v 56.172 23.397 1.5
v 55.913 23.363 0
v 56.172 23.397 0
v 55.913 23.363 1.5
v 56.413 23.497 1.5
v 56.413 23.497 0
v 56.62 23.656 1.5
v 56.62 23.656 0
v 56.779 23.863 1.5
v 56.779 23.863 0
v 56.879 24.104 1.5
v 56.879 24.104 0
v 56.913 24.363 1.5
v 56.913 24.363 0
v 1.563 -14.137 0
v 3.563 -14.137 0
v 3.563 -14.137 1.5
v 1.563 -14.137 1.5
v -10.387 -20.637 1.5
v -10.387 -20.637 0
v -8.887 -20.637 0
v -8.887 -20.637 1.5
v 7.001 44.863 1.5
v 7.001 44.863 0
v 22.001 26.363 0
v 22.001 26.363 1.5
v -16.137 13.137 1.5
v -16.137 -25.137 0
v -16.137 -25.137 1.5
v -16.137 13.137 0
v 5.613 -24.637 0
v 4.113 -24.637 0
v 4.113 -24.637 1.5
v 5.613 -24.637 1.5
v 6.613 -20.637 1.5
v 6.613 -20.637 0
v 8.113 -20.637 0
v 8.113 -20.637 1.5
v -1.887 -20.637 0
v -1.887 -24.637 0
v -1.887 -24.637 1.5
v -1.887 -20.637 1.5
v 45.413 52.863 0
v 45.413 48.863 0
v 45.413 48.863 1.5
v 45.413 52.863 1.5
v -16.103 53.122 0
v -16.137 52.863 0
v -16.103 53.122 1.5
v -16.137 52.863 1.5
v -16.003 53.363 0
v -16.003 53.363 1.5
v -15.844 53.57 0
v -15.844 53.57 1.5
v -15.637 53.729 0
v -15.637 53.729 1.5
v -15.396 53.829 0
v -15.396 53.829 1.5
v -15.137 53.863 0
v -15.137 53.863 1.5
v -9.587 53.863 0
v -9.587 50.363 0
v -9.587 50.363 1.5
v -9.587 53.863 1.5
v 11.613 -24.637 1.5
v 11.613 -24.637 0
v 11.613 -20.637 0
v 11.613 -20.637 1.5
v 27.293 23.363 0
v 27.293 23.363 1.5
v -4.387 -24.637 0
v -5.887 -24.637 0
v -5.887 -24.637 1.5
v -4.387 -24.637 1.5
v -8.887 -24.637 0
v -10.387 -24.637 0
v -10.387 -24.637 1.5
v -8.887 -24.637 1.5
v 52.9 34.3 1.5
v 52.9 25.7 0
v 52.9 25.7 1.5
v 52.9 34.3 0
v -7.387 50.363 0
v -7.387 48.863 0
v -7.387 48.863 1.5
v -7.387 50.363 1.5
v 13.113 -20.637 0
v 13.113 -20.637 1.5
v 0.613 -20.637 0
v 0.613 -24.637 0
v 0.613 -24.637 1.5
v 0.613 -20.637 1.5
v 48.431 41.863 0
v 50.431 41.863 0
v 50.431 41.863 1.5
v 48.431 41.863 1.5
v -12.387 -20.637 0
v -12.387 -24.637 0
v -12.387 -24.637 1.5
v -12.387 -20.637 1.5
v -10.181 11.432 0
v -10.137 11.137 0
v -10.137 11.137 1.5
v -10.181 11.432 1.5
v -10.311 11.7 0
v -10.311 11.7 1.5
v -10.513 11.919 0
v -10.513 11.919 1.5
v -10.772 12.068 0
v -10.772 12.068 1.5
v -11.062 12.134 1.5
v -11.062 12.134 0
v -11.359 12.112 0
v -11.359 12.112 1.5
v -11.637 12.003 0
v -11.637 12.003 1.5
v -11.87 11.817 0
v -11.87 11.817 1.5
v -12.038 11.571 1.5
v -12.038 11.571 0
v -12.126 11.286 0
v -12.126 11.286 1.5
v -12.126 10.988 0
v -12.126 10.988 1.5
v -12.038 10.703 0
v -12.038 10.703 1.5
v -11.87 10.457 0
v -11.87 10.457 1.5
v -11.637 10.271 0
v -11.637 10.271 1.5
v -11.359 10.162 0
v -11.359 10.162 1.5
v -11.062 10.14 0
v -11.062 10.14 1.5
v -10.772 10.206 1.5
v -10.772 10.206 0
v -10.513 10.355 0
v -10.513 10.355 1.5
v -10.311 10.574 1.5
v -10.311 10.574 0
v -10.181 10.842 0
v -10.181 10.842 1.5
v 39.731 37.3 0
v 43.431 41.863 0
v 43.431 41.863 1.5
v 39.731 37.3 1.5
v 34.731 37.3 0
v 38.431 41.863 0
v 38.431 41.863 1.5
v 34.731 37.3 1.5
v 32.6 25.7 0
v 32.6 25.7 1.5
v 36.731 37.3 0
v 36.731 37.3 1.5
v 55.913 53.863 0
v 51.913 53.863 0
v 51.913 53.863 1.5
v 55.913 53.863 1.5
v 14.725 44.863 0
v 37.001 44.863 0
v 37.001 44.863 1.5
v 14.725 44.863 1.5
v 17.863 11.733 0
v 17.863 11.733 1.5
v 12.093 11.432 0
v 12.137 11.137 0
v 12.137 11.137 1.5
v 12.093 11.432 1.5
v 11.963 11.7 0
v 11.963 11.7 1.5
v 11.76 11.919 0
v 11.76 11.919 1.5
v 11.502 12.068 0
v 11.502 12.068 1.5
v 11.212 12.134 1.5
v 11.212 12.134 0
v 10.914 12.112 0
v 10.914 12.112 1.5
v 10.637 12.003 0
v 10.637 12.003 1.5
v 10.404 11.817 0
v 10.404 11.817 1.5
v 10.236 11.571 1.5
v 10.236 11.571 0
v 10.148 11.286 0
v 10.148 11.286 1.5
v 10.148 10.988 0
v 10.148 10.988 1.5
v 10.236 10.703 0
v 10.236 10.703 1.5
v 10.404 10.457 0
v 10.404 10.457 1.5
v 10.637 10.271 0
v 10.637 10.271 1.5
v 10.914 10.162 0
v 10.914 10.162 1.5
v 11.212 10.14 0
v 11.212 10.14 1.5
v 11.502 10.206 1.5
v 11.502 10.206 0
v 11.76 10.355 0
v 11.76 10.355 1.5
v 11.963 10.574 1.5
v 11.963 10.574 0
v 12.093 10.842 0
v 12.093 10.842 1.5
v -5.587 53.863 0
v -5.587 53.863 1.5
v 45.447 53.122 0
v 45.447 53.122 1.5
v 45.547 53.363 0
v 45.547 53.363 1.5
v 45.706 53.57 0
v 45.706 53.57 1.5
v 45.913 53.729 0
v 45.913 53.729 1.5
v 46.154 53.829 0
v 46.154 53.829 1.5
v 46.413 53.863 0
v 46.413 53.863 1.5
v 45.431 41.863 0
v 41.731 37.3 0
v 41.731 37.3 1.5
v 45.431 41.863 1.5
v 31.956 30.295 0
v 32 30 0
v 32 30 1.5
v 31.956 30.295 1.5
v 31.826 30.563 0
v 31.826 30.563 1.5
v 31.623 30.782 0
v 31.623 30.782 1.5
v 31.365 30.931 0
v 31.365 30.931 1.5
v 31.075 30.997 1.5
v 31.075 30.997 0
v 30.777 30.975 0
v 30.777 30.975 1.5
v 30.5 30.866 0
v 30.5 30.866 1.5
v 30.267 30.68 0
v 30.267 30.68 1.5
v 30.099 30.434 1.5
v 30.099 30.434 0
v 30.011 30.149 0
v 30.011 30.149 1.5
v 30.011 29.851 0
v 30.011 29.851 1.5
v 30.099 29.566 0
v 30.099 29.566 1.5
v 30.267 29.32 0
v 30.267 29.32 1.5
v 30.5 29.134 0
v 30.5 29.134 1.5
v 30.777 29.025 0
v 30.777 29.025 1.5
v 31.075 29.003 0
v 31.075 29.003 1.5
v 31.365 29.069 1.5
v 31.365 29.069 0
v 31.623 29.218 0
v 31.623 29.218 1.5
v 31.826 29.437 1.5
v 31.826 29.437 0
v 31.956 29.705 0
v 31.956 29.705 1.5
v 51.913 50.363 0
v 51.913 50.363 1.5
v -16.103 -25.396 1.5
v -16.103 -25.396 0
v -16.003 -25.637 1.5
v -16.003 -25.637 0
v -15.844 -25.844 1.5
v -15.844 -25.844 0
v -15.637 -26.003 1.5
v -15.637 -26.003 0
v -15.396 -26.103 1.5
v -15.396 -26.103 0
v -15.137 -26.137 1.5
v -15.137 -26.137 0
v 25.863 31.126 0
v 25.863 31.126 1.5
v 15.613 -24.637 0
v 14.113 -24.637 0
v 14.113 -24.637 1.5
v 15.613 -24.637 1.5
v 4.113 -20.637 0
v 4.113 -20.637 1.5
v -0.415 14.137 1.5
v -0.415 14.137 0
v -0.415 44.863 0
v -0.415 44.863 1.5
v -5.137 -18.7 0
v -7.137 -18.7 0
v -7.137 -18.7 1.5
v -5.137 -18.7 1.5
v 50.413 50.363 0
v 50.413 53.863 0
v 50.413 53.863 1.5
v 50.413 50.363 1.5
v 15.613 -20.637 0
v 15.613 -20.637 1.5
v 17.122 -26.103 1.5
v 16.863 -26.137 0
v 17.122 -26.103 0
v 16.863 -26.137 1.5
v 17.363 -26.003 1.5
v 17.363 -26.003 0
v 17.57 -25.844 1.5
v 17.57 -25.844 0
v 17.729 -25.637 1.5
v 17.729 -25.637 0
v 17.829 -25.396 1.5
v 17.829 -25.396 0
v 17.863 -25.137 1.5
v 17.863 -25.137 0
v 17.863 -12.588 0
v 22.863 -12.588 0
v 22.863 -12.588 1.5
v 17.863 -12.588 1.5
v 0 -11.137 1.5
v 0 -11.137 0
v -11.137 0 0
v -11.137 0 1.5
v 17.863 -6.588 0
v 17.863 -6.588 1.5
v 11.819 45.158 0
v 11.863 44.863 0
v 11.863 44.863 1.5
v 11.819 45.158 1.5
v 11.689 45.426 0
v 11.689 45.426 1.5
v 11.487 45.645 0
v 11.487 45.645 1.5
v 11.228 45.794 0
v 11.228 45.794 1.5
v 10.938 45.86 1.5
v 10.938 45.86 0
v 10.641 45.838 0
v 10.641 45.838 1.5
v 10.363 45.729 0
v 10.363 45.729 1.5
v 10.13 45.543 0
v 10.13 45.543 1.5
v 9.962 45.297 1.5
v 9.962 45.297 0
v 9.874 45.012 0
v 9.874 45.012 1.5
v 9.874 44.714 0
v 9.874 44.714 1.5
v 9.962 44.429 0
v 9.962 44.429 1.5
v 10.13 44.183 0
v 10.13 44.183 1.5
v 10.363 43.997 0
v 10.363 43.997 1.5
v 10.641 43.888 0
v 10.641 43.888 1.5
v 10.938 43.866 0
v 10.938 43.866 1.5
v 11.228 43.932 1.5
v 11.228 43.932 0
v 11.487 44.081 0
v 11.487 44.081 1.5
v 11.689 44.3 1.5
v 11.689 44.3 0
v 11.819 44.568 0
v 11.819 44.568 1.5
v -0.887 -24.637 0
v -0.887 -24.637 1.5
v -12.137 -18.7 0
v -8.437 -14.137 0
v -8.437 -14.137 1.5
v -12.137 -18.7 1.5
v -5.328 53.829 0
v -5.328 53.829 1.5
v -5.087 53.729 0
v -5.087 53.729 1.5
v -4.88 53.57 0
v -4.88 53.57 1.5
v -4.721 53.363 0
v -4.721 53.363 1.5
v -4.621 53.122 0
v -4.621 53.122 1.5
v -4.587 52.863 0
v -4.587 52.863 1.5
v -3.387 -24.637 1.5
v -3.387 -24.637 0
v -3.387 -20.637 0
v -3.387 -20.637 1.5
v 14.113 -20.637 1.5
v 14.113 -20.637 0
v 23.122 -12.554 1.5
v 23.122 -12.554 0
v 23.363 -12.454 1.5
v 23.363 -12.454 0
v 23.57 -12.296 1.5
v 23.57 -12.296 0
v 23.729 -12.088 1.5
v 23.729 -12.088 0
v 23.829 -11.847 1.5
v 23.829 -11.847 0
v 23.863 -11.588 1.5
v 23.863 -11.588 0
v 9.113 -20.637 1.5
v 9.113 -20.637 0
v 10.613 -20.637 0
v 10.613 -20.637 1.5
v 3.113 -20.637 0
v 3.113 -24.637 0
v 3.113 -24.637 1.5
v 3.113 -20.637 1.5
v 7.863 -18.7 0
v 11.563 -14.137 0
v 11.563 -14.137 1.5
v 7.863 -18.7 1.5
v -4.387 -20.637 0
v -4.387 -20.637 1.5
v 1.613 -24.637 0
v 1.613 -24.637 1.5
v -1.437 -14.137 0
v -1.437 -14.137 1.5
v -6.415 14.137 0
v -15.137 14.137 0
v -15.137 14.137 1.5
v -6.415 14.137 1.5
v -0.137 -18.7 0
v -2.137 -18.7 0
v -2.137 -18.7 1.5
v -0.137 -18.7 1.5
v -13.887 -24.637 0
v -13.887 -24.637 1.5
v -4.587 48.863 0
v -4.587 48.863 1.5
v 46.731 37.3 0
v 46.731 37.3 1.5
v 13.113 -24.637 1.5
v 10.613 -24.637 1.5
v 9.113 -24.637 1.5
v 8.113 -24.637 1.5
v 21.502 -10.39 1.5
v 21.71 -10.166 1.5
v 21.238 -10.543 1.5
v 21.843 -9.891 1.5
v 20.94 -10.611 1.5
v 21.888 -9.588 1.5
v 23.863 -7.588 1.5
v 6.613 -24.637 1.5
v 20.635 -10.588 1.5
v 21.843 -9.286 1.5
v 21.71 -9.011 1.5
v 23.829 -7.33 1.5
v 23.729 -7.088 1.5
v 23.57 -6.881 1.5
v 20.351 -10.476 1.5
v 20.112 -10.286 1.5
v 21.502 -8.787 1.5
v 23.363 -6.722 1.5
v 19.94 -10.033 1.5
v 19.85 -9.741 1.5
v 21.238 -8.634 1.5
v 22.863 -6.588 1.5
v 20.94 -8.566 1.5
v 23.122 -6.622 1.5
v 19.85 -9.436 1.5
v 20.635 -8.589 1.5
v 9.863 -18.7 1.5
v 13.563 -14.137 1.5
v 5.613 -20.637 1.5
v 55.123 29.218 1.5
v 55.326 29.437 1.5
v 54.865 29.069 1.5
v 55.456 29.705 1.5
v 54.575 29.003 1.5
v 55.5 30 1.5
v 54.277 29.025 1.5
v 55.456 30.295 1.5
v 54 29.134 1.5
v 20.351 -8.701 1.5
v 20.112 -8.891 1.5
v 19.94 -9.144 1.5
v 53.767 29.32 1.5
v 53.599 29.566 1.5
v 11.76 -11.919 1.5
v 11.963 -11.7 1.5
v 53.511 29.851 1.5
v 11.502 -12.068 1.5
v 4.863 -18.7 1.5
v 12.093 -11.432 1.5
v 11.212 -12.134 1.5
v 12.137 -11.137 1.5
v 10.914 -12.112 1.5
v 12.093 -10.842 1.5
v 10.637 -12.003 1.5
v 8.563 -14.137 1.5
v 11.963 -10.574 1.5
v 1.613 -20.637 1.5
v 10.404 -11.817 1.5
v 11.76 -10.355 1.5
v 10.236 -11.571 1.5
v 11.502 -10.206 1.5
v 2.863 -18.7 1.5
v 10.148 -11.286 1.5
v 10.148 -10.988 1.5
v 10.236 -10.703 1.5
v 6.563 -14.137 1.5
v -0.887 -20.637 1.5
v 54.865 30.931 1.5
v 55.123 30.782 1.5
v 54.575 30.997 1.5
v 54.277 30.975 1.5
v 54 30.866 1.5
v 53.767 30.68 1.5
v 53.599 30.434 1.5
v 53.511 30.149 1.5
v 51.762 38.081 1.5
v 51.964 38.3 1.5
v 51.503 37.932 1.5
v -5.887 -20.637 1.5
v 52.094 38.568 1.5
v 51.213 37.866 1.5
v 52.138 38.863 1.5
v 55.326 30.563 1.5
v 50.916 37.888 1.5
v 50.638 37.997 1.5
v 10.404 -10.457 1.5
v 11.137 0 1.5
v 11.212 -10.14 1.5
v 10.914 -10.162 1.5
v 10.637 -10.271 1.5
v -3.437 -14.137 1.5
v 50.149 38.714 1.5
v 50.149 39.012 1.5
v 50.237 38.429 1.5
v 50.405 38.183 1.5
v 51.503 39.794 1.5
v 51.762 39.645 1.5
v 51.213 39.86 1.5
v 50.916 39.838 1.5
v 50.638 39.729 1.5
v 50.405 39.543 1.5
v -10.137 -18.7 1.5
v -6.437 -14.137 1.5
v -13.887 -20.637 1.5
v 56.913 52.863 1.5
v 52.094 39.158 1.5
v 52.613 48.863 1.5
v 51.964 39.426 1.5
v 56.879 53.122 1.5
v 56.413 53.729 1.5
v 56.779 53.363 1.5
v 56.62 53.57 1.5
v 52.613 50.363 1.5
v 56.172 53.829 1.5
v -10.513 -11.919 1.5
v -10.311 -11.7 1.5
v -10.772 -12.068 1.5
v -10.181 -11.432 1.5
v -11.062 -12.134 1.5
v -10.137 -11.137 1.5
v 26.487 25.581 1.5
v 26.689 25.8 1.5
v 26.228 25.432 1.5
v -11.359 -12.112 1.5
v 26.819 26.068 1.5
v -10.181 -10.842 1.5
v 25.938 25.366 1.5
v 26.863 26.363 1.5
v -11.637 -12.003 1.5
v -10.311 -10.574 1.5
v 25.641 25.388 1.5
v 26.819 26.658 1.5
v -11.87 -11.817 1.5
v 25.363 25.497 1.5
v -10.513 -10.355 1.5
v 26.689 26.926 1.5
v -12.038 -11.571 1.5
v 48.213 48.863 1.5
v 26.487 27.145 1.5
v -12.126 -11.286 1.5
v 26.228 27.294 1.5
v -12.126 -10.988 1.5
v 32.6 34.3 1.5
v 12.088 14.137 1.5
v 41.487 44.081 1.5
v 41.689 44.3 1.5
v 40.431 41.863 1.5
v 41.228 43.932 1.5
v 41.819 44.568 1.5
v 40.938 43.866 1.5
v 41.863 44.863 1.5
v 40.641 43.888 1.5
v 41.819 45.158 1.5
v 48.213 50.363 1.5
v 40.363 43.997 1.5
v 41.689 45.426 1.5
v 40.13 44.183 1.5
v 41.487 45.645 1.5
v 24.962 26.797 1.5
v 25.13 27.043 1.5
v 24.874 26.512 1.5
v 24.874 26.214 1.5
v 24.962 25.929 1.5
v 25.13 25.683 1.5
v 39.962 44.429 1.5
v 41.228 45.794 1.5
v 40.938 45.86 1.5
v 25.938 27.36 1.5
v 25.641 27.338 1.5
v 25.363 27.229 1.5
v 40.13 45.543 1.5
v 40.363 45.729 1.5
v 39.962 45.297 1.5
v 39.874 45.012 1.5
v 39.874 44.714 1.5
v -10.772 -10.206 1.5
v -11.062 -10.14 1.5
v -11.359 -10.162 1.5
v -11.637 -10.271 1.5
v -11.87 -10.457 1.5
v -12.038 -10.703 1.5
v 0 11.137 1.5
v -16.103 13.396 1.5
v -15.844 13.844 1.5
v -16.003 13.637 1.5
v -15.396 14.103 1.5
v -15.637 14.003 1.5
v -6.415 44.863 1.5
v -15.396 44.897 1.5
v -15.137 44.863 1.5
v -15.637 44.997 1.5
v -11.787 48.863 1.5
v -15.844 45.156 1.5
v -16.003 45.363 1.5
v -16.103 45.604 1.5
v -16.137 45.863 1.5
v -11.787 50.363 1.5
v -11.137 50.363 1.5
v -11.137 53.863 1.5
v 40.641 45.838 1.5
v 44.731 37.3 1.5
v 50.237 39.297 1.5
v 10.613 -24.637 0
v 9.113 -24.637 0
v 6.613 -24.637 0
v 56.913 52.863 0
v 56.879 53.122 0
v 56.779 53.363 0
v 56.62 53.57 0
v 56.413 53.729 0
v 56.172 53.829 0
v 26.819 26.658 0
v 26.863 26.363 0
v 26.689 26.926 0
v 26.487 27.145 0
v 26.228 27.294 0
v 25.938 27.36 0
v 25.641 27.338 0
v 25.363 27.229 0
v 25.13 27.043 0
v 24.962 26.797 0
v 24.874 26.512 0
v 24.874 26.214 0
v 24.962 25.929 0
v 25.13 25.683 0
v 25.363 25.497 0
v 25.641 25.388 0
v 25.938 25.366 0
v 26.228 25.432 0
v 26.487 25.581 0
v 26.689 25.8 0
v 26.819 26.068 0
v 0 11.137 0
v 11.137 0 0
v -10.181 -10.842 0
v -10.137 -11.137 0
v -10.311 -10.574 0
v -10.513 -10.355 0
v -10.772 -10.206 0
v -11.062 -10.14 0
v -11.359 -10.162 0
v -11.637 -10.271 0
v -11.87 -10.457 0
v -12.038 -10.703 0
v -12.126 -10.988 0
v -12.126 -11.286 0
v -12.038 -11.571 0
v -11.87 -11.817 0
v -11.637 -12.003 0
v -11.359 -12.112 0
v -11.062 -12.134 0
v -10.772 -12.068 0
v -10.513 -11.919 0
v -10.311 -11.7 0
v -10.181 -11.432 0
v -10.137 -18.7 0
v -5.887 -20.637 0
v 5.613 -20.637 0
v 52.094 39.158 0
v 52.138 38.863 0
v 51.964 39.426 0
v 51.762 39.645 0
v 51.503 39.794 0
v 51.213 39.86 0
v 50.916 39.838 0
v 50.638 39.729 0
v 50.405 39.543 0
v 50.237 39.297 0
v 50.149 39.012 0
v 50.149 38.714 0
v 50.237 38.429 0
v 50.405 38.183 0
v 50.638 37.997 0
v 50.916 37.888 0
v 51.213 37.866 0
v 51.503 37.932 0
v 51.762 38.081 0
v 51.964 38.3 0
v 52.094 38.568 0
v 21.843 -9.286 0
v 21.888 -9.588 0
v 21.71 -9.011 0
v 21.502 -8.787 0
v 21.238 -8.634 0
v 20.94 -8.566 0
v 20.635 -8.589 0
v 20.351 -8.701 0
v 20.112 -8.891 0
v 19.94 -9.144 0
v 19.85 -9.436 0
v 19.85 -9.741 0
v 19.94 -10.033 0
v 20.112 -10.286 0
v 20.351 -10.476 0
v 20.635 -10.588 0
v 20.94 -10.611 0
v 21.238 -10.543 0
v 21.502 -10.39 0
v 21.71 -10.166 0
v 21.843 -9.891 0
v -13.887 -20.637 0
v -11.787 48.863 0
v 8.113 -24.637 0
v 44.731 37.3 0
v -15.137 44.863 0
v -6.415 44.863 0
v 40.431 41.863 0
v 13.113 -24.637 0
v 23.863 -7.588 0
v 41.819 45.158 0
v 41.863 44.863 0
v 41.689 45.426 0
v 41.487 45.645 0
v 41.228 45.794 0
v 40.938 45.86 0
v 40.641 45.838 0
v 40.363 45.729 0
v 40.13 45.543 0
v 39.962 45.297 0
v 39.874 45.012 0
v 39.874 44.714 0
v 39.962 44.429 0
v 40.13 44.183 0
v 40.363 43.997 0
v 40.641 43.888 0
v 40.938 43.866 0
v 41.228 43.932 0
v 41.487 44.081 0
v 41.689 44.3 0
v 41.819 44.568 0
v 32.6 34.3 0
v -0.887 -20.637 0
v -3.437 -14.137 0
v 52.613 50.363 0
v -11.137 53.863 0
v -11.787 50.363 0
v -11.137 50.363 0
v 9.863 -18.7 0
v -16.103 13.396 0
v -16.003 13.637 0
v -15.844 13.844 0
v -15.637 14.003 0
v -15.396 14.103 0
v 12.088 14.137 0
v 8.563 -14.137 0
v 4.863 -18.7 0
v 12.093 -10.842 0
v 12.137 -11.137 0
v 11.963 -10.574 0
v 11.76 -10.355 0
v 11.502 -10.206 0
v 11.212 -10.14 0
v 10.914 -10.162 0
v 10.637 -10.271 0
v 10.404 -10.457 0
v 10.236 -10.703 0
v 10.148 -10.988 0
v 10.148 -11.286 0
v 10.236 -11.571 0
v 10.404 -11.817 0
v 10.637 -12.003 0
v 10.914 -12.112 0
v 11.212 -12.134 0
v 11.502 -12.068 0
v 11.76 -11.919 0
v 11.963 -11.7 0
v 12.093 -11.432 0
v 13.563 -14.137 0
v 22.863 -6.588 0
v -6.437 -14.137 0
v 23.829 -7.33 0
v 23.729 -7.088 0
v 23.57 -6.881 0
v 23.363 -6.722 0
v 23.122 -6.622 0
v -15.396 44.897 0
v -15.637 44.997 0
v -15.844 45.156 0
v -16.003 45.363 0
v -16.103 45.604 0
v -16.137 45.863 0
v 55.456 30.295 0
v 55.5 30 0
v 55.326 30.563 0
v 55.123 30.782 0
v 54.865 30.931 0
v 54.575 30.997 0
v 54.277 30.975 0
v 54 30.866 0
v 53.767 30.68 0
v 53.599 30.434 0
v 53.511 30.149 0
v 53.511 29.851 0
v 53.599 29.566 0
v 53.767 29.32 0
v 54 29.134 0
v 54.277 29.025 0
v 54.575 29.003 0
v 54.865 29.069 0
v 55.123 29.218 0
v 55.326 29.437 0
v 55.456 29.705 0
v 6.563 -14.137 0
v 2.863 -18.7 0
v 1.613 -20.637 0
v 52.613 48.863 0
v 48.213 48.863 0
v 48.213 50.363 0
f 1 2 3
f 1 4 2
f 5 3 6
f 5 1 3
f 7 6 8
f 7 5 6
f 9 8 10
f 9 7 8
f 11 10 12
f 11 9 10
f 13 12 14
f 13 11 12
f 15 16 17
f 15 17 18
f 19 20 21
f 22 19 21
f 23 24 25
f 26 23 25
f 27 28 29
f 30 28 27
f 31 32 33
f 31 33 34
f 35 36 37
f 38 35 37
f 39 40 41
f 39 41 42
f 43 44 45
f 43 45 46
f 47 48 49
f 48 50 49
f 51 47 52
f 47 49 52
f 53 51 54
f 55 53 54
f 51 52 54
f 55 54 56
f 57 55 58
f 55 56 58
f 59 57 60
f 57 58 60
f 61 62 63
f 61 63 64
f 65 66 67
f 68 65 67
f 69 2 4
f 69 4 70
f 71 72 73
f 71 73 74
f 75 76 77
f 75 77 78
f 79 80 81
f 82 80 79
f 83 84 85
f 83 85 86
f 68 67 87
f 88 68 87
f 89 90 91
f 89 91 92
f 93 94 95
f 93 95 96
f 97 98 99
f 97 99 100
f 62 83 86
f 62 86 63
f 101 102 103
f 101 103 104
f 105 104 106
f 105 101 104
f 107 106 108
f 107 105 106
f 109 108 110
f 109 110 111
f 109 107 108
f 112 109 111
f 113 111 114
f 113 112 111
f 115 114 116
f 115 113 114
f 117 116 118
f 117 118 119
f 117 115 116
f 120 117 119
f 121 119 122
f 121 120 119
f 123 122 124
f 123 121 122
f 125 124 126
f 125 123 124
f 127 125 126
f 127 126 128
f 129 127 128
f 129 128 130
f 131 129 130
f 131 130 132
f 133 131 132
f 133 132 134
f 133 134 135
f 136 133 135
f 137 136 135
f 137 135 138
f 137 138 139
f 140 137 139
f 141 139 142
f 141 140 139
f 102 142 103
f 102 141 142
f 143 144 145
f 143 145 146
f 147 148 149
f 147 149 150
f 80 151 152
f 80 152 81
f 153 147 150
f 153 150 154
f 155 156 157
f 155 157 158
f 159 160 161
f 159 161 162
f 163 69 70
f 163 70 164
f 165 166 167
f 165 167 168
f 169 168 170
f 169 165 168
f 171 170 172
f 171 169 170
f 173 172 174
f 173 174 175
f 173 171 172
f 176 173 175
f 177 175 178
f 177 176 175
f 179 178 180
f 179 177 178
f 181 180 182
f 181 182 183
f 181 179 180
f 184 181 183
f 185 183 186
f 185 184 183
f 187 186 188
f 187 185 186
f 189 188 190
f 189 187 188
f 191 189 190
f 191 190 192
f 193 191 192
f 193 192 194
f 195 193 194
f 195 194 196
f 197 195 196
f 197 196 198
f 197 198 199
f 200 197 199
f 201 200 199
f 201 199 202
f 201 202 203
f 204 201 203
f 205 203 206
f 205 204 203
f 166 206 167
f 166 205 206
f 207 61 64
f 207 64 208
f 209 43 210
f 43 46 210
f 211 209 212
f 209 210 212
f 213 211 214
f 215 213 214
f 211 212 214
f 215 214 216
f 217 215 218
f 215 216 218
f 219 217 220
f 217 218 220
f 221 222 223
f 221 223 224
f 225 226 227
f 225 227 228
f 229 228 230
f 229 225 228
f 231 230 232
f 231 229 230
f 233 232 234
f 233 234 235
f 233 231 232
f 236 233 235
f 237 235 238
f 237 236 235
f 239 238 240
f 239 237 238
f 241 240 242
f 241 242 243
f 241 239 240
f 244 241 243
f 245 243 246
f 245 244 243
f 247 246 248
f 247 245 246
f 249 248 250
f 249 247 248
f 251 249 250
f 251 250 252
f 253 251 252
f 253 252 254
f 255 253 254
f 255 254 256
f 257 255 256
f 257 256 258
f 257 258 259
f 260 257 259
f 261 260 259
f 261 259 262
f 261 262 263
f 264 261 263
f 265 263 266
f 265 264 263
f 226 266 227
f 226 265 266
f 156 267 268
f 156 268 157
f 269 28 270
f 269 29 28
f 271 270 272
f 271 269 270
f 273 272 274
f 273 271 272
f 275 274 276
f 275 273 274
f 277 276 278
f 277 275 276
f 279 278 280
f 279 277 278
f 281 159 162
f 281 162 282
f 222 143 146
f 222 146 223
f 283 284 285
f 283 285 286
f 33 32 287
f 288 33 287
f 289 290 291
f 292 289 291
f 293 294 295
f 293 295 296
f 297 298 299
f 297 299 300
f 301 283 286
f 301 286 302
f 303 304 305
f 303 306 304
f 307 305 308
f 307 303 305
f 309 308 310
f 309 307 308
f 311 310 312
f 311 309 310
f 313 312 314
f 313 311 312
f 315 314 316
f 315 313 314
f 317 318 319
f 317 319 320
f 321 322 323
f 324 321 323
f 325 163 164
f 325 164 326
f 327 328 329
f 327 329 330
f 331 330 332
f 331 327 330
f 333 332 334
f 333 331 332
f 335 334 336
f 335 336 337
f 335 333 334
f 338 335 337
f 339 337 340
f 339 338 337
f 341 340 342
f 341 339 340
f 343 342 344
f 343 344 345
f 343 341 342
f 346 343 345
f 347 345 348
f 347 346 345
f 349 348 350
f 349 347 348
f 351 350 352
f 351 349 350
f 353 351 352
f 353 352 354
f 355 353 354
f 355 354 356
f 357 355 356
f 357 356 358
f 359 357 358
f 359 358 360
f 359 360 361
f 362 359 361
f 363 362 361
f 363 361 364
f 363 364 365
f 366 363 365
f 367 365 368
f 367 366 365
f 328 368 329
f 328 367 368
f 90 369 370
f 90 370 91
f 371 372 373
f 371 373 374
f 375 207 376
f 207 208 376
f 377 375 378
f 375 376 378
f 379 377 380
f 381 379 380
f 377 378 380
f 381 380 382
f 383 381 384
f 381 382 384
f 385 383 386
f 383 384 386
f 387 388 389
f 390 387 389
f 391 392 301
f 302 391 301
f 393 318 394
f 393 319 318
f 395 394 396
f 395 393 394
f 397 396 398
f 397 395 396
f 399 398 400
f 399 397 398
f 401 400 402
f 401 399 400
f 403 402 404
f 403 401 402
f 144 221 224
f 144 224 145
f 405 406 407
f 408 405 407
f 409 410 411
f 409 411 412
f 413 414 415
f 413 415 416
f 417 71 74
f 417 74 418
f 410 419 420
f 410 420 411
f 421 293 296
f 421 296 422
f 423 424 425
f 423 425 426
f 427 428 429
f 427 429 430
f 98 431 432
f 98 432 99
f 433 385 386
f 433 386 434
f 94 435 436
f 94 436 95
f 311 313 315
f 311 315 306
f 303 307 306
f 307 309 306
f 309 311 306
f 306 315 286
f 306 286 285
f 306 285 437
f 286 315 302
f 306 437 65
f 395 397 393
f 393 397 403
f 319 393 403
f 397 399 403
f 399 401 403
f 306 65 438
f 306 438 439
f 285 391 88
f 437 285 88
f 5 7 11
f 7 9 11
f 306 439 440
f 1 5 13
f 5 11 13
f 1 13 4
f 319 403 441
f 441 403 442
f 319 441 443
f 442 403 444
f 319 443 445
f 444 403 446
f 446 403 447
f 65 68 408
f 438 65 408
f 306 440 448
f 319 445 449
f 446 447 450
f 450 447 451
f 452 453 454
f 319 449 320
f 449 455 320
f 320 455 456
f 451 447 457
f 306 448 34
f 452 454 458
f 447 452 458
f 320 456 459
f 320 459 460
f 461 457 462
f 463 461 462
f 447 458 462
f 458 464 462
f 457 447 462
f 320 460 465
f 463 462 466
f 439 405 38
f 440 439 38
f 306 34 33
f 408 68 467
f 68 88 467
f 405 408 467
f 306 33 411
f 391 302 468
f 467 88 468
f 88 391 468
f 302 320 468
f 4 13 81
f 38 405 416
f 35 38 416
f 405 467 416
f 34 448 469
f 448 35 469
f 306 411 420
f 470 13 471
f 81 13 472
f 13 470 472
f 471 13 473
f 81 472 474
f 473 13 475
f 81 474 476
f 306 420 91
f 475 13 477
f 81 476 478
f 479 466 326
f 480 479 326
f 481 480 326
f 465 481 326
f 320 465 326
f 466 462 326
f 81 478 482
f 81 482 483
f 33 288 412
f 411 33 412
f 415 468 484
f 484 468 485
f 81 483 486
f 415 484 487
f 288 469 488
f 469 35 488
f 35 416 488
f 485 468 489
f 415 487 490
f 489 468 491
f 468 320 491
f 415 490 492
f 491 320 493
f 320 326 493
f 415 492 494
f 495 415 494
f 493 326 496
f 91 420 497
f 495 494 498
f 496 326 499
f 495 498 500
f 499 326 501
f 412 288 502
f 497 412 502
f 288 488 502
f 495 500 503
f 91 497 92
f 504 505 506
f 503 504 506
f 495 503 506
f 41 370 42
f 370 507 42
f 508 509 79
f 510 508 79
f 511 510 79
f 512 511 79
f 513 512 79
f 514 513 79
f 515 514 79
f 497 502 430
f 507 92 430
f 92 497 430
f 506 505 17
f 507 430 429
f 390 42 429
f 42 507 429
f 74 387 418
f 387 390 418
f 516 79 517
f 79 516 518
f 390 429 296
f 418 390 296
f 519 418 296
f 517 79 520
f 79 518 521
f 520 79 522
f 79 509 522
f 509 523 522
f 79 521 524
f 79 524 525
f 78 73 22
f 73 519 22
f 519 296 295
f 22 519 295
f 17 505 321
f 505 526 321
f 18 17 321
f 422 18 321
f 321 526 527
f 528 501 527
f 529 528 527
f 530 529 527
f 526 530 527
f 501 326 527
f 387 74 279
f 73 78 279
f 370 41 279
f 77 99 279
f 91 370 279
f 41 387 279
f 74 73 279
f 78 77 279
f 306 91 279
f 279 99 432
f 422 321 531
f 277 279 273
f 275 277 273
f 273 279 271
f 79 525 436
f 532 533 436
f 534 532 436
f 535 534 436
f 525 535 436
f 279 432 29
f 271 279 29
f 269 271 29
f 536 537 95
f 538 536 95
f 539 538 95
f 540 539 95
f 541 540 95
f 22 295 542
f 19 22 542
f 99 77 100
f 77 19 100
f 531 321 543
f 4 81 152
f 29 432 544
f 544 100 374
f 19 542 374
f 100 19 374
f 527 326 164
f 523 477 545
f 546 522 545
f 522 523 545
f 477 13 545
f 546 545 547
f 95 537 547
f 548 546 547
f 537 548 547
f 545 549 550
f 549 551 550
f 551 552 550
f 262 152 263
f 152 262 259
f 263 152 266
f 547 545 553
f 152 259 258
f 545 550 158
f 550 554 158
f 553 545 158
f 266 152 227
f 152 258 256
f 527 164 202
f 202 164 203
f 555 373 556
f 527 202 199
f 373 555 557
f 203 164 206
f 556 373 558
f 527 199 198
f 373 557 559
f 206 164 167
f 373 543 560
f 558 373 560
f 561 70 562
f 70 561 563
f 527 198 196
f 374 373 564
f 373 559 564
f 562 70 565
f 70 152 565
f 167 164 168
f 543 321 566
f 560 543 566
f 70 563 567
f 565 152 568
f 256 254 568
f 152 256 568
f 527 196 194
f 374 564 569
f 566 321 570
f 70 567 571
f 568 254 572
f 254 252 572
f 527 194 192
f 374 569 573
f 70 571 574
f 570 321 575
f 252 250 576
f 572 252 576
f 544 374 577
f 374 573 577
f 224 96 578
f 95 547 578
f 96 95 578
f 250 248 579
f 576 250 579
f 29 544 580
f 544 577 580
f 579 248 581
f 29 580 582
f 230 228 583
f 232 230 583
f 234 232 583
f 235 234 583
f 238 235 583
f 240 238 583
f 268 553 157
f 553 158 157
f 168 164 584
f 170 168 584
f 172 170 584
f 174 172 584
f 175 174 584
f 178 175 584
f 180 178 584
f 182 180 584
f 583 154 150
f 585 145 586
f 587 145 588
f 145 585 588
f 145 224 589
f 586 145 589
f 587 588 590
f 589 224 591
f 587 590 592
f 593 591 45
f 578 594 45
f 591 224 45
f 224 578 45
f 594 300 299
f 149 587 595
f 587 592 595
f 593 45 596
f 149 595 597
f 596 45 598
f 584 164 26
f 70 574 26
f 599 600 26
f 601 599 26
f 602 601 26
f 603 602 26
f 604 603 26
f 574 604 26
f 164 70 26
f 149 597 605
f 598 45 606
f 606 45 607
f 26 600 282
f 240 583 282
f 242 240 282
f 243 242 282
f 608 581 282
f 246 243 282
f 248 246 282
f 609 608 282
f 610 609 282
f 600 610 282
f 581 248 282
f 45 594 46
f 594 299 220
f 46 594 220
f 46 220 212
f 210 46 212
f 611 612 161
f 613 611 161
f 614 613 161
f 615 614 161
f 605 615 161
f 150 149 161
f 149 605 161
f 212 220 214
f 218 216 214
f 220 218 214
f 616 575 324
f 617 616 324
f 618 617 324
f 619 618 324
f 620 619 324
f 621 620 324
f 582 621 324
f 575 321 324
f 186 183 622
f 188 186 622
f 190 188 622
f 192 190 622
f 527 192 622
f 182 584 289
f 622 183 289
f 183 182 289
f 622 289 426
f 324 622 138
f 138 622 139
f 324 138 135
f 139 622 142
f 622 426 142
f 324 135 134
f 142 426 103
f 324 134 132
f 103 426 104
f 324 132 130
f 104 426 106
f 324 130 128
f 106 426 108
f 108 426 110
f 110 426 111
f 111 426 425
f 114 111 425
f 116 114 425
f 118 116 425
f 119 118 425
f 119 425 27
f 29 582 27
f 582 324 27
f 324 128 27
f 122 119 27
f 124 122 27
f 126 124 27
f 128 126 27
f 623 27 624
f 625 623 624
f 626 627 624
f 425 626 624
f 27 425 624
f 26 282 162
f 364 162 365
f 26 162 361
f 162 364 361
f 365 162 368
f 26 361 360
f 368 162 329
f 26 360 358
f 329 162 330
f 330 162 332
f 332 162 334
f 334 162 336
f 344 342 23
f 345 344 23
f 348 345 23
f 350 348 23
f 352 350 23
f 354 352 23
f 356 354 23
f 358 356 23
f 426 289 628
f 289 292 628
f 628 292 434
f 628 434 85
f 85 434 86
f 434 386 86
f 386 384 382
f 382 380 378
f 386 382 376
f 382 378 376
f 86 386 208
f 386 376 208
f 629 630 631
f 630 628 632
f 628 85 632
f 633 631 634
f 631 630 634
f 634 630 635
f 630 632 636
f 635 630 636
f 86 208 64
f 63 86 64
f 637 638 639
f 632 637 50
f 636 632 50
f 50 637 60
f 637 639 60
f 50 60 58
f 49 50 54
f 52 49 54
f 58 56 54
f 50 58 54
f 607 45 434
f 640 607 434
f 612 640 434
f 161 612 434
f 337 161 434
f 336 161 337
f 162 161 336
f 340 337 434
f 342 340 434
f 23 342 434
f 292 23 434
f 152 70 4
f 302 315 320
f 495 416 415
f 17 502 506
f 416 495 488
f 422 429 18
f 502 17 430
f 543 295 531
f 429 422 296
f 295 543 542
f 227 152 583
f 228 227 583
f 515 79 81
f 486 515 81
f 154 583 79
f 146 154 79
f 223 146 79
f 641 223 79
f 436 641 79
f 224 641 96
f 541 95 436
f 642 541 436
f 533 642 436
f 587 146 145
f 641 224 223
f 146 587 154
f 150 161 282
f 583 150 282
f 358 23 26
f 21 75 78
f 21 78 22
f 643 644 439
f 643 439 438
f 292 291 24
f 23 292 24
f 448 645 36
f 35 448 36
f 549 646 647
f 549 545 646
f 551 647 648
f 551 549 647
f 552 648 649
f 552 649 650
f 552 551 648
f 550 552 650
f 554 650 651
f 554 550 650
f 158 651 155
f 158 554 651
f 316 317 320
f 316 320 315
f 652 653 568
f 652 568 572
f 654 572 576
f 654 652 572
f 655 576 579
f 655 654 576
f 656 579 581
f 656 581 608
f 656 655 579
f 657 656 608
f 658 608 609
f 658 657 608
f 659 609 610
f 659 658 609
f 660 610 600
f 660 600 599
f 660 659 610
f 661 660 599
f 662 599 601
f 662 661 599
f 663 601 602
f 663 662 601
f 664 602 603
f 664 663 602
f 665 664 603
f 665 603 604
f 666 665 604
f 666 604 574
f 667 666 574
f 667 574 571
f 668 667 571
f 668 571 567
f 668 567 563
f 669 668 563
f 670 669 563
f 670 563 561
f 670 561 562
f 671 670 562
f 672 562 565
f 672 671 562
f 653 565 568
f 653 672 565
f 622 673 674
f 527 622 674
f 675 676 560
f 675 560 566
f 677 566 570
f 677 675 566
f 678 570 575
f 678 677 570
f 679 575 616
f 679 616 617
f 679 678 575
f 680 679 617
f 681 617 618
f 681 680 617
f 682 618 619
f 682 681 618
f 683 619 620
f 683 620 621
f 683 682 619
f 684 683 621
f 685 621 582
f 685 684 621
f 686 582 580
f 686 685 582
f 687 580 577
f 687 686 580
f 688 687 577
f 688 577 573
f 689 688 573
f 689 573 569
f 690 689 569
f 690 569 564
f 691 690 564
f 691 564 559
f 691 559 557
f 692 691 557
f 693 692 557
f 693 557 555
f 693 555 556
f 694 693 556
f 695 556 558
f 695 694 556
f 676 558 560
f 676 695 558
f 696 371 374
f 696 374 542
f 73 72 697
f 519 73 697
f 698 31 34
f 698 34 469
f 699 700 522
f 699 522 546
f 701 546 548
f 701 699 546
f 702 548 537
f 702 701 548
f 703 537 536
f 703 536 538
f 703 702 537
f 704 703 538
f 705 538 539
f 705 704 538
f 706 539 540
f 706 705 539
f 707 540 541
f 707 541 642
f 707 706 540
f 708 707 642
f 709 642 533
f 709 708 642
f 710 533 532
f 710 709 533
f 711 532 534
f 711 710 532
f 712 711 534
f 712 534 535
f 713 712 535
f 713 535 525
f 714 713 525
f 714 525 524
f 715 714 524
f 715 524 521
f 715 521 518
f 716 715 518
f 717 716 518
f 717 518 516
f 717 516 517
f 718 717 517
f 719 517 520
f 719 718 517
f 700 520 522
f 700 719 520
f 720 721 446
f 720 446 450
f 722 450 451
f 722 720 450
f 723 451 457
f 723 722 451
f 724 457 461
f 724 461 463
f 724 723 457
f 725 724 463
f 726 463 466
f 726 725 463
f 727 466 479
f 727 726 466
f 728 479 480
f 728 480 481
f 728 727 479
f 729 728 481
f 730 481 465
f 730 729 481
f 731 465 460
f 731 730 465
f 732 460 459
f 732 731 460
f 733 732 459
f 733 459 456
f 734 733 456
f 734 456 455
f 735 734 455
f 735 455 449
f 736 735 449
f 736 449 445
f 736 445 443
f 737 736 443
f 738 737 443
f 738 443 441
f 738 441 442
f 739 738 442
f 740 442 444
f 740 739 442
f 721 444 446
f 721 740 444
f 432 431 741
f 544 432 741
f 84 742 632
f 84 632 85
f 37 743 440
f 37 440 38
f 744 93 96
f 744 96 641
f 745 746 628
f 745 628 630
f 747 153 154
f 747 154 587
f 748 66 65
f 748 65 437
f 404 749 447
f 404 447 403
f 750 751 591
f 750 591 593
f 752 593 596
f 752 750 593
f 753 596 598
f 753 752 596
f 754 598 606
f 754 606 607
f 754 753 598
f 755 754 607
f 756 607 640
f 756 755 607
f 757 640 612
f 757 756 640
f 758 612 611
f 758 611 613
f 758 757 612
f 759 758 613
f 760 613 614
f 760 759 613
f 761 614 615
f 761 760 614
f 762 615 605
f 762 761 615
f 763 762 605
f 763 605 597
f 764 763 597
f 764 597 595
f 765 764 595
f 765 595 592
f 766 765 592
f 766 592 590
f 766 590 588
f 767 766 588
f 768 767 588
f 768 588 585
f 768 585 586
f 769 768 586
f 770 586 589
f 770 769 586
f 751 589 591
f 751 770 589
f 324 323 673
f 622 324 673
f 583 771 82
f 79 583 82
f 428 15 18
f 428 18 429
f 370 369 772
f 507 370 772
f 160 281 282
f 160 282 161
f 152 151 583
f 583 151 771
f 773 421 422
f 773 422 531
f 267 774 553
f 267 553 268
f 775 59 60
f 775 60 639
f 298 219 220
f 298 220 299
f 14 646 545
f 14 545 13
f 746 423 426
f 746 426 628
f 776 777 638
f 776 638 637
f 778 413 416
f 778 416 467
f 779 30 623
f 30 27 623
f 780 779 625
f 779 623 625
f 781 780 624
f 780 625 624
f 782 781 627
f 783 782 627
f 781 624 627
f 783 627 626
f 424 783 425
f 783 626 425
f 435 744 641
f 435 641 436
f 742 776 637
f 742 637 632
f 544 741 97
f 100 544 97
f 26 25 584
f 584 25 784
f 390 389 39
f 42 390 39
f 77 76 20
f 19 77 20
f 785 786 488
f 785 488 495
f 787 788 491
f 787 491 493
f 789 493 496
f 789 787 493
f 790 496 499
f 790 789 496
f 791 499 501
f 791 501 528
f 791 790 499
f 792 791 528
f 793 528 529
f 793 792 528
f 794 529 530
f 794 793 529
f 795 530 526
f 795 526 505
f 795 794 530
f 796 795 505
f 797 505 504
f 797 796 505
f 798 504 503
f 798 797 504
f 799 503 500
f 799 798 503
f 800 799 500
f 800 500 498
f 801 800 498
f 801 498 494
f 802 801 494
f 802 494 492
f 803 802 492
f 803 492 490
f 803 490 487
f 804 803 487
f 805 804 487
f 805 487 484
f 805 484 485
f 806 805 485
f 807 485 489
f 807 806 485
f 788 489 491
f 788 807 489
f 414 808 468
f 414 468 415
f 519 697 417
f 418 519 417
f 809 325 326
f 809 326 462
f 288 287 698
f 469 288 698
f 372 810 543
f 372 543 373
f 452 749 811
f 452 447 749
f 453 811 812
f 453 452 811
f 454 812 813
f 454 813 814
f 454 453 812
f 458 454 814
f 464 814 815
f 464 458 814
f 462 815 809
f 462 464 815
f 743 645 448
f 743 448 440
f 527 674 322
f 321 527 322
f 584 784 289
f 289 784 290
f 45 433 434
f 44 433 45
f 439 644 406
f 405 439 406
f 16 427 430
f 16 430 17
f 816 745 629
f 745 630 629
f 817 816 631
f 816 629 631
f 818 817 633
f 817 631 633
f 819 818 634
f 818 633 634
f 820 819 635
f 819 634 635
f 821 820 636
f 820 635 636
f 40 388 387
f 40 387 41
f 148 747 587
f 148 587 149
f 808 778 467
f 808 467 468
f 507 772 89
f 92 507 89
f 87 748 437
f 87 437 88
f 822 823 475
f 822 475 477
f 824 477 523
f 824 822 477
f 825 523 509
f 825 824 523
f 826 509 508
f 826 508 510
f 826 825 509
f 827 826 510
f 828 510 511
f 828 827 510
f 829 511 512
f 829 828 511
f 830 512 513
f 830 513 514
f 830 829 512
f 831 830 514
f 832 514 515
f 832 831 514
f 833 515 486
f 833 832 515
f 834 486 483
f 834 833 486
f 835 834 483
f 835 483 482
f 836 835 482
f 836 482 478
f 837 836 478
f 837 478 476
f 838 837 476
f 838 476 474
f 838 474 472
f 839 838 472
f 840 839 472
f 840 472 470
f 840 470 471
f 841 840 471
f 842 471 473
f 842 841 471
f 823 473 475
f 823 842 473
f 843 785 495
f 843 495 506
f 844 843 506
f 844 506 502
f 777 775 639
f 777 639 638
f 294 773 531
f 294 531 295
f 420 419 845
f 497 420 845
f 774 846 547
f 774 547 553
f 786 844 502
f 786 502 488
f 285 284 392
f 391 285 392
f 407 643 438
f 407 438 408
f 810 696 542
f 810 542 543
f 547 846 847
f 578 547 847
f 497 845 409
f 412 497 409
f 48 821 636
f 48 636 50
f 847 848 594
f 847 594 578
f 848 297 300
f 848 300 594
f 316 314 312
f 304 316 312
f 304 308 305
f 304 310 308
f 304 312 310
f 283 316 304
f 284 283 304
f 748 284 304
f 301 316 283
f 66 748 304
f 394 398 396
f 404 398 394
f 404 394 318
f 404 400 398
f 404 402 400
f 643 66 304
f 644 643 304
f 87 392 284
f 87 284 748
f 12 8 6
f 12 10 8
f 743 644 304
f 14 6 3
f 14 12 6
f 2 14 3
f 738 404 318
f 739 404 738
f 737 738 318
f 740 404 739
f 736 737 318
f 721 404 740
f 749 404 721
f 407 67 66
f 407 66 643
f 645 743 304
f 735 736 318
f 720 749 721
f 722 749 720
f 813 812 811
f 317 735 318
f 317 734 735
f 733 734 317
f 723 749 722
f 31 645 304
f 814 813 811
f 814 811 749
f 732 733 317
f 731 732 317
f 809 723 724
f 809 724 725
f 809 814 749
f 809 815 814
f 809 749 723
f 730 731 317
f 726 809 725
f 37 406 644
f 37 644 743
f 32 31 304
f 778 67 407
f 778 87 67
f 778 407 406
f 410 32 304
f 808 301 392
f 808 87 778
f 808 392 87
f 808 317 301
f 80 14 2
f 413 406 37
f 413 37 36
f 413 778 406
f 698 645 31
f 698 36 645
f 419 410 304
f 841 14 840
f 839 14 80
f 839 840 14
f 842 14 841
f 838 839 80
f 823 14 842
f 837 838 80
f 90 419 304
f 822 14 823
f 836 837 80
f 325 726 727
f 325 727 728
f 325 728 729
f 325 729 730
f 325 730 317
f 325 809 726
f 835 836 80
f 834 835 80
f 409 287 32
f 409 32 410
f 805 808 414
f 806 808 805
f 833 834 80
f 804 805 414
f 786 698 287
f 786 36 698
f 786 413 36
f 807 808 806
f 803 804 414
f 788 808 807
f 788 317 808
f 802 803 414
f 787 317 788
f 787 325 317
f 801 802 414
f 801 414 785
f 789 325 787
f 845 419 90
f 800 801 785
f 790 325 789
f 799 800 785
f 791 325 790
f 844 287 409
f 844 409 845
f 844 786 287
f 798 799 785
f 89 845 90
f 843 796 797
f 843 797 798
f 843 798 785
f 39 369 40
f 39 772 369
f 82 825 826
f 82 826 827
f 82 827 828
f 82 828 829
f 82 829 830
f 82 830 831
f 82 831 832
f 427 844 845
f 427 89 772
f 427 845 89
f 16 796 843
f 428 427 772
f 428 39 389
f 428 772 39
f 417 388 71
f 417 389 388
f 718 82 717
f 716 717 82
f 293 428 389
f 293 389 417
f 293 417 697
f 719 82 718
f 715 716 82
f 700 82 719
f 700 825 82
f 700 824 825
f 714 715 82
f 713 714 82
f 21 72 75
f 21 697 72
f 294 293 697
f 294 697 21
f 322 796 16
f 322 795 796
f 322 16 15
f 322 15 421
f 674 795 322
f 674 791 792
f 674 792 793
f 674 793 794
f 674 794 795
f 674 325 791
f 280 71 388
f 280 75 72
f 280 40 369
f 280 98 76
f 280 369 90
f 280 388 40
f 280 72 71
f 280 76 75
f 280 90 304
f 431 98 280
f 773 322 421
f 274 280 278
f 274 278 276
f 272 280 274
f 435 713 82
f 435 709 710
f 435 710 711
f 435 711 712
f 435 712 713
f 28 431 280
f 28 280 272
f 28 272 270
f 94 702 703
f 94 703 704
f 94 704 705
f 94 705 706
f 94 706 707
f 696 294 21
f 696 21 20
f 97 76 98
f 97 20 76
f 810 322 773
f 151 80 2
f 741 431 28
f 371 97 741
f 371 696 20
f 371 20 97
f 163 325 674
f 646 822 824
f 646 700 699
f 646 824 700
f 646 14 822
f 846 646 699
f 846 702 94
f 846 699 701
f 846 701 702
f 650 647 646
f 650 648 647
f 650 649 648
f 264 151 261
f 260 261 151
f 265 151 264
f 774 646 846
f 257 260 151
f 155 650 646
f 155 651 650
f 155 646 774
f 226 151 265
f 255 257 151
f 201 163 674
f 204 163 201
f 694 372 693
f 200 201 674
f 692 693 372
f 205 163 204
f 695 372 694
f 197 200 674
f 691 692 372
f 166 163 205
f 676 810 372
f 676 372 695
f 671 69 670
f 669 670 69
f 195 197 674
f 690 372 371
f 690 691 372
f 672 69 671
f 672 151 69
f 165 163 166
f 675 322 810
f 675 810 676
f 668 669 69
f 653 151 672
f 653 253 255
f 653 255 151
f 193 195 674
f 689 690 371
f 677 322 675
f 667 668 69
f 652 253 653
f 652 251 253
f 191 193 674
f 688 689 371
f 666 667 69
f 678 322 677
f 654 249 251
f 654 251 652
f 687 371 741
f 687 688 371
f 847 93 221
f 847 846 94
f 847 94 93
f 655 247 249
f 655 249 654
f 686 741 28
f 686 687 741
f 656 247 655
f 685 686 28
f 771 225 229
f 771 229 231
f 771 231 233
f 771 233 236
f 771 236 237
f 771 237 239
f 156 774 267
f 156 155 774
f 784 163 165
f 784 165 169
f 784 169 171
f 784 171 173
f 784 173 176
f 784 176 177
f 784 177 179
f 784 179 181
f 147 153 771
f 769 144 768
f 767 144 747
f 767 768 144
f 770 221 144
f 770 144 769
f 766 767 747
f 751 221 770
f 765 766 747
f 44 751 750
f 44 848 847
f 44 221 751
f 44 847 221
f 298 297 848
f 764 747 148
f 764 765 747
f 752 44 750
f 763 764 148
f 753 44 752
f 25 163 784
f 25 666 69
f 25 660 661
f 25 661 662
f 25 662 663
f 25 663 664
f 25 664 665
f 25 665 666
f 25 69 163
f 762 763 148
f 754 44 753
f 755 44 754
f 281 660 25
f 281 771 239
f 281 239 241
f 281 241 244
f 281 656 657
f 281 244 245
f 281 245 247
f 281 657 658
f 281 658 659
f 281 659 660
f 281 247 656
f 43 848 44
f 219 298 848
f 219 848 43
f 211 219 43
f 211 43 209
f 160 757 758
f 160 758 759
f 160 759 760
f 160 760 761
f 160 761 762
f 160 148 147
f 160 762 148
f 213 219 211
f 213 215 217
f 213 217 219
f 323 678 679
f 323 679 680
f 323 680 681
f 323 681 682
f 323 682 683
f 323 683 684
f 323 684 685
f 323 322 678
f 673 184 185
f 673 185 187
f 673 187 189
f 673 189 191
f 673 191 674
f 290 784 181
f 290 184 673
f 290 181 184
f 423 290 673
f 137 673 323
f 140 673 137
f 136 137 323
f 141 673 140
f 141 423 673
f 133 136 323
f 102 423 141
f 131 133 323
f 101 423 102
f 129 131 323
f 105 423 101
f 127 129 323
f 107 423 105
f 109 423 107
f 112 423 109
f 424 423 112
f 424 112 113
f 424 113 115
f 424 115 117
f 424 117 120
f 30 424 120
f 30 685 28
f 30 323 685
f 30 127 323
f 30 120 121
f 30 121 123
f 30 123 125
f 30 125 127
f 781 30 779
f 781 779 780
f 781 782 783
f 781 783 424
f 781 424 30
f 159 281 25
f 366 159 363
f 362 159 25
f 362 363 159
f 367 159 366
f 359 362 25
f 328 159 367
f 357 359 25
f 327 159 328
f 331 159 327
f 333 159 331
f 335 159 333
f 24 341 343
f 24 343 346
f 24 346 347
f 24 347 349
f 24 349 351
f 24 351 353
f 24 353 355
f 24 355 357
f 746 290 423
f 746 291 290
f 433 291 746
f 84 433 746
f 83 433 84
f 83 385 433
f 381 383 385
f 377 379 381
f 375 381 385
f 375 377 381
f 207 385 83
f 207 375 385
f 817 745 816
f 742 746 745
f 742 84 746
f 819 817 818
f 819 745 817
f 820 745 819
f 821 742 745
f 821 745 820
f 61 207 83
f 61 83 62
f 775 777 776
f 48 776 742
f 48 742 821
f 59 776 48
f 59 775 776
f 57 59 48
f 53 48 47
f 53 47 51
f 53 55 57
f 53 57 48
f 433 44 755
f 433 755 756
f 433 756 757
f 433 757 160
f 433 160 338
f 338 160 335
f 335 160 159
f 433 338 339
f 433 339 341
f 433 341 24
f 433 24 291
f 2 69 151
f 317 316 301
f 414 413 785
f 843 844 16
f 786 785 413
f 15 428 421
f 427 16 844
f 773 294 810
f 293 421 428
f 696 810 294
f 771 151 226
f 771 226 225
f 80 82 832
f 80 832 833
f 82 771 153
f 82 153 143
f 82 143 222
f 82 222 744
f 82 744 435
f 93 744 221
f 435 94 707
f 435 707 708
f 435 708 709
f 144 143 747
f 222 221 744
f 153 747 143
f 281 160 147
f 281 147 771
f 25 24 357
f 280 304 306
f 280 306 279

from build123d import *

# Parameters (mm, degrees)
SKETCH_1_R      = 1
SKETCH_1_R_2    = 1.025
SKETCH_1_W      = 20.3
SKETCH_1_H      = 8.6
SKETCH_1_W_2    = 1.5
SKETCH_1_H_2    = 4
EXTRUDE_1_DEPTH = 1.5
FILLET_1_R      = 1


with BuildPart() as part:
    # 草图1 → 凸台-拉伸1 (new body)
    with BuildSketch(Plane.XY):
        Polygon((-16.136931804, -26.136931804), (-16.136931804, 14.136931804), (-6.414578713, 14.136931804), (-6.414578713, 44.863068196), (-16.136931804, 44.863068196), (-16.136931804, 53.863068196), (-11.136931804, 53.863068196), (-11.136931804, 50.363068196), (-11.786931804, 50.363068196), (-11.786931804, 48.863068196), (-7.386931804, 48.863068196), (-7.386931804, 50.363068196), (-9.586931804, 50.363068196), (-9.586931804, 53.863068196), (-4.586931804, 53.863068196), (-4.586931804, 48.863068196), (45.413068196, 48.863068196), (45.413068196, 53.863068196), (50.413068196, 53.863068196), (50.413068196, 50.363068196), (48.213068196, 50.363068196), (48.213068196, 48.863068196), (50.413068196, 48.863068196), (51.913068196, 48.863068196), (52.613068196, 48.863068196), (52.613068196, 50.363068196), (51.913068196, 50.363068196), (51.913068196, 53.863068196), (56.913068196, 53.863068196), (56.913068196, 23.363068196), (27.29285372, 23.363068196), (17.863068196, 11.732999384), (17.863068196, -6.588407425), (23.863068196, -6.588407425), (23.863068196, -12.588407425), (17.863068196, -12.588407425), (17.863068196, -26.136931804), align=None)
        with Locations((11.136931804, 11.136931804)):
            Circle(SKETCH_1_R, mode=Mode.SUBTRACT)
        with Locations((31, 30)):
            Circle(SKETCH_1_R, mode=Mode.SUBTRACT)
        with Locations((54.5, 30)):
            Circle(SKETCH_1_R, mode=Mode.SUBTRACT)
        with Locations((20.863068196, -9.588407425)):
            Circle(SKETCH_1_R_2, mode=Mode.SUBTRACT)
        with Locations((25.863068196, 26.363068196)):
            Circle(SKETCH_1_R, mode=Mode.SUBTRACT)
        with Locations((40.863068196, 44.863068196)):
            Circle(SKETCH_1_R, mode=Mode.SUBTRACT)
        with Locations((10.863068196, 44.863068196)):
            Circle(SKETCH_1_R, mode=Mode.SUBTRACT)
        with Locations((51.138068196, 38.863068196)):
            Circle(SKETCH_1_R, mode=Mode.SUBTRACT)
        with Locations((11.136931804, -11.136931804)):
            Circle(SKETCH_1_R, mode=Mode.SUBTRACT)
        with Locations((-11.136931804, -11.136931804)):
            Circle(SKETCH_1_R, mode=Mode.SUBTRACT)
        with Locations((-11.136931804, 11.136931804)):
            Circle(SKETCH_1_R, mode=Mode.SUBTRACT)
        with Locations((42.75, 30)):
            Rectangle(SKETCH_1_W, SKETCH_1_H, mode=Mode.SUBTRACT)
        with Locations((-9.636931804, -22.636931804)):
            Rectangle(SKETCH_1_W_2, SKETCH_1_H_2, mode=Mode.SUBTRACT)
        with Locations((14.863068196, -22.636931804)):
            Rectangle(SKETCH_1_W_2, SKETCH_1_H_2, mode=Mode.SUBTRACT)
        with Locations((12.363068196, -22.636931804)):
            Rectangle(SKETCH_1_W_2, SKETCH_1_H_2, mode=Mode.SUBTRACT)
        with Locations((-13.136931804, -22.636931804)):
            Rectangle(SKETCH_1_W_2, SKETCH_1_H_2, mode=Mode.SUBTRACT)
        Polygon((37.00085024, 44.863068196), (14.725286152, 44.863068196), (25.863068196, 31.126470342), align=None, mode=Mode.SUBTRACT)
        with Locations((9.863068196, -22.636931804)):
            Rectangle(SKETCH_1_W_2, SKETCH_1_H_2, mode=Mode.SUBTRACT)
        with Locations((7.363068196, -22.636931804)):
            Rectangle(SKETCH_1_W_2, SKETCH_1_H_2, mode=Mode.SUBTRACT)
        with Locations((4.863068196, -22.636931804)):
            Rectangle(SKETCH_1_W_2, SKETCH_1_H_2, mode=Mode.SUBTRACT)
        with Locations((2.363068196, -22.636931804)):
            Rectangle(SKETCH_1_W_2, SKETCH_1_H_2, mode=Mode.SUBTRACT)
        with Locations((-0.136931804, -22.636931804)):
            Rectangle(SKETCH_1_W_2, SKETCH_1_H_2, mode=Mode.SUBTRACT)
        with Locations((-2.636931804, -22.636931804)):
            Rectangle(SKETCH_1_W_2, SKETCH_1_H_2, mode=Mode.SUBTRACT)
        with Locations((-5.136931804, -22.636931804)):
            Rectangle(SKETCH_1_W_2, SKETCH_1_H_2, mode=Mode.SUBTRACT)
        Polygon((-11.136931804, 0), (0, 11.136931804), (11.136931804, 0), (0, -11.136931804), align=None, mode=Mode.SUBTRACT)
        Polygon((22.00085024, 26.363068196), (12.087766679, 14.136931804), (-0.414578713, 14.136931804), (-0.414578713, 44.863068196), (7.00085024, 44.863068196), align=None, mode=Mode.SUBTRACT)
        Polygon((38.430635764, 41.863068196), (34.73085074, 37.3), (36.73085074, 37.3), (40.430635764, 41.863068196), align=None, mode=Mode.SUBTRACT)
        Polygon((43.430635764, 41.863068196), (39.73085074, 37.3), (41.73085074, 37.3), (45.430635764, 41.863068196), align=None, mode=Mode.SUBTRACT)
        Polygon((48.430635764, 41.863068196), (44.73085074, 37.3), (46.73085074, 37.3), (50.430635764, 41.863068196), align=None, mode=Mode.SUBTRACT)
        Polygon((-8.43714678, -14.136931804), (-12.136931804, -18.7), (-10.136931804, -18.7), (-6.43714678, -14.136931804), align=None, mode=Mode.SUBTRACT)
        Polygon((-3.43714678, -14.136931804), (-7.136931804, -18.7), (-5.136931804, -18.7), (-1.43714678, -14.136931804), align=None, mode=Mode.SUBTRACT)
        Polygon((1.56285322, -14.136931804), (-2.136931804, -18.7), (-0.136931804, -18.7), (3.56285322, -14.136931804), align=None, mode=Mode.SUBTRACT)
        Polygon((6.56285322, -14.136931804), (2.863068196, -18.7), (4.863068196, -18.7), (8.56285322, -14.136931804), align=None, mode=Mode.SUBTRACT)
        Polygon((11.56285322, -14.136931804), (7.863068196, -18.7), (9.863068196, -18.7), (13.56285322, -14.136931804), align=None, mode=Mode.SUBTRACT)
    extrude(amount=EXTRUDE_1_DEPTH)

    # 圆角1
    fillet_1_edges = [part.edges().sort_by_distance(p)[0] for p in [
        (-16.136931804, -26.136931804, 0.75),
        (-16.136931804, 14.136931804, 0.75),
        (-16.136931804, 44.863068196, 0.75),
        (-16.136931804, 53.863068196, 0.75),
        (-4.586931804, 53.863068196, 0.75),
        (45.413068196, 53.863068196, 0.75),
        (56.913068196, 53.863068196, 0.75),
        (56.913068196, 23.363068196, 0.75),
        (23.863068196, -6.588407425, 0.75),
        (23.863068196, -12.588407425, 0.75),
        (17.863068196, -26.136931804, 0.75),
    ]]
    fillet(fillet_1_edges, radius=FILLET_1_R)


solid = part.part
